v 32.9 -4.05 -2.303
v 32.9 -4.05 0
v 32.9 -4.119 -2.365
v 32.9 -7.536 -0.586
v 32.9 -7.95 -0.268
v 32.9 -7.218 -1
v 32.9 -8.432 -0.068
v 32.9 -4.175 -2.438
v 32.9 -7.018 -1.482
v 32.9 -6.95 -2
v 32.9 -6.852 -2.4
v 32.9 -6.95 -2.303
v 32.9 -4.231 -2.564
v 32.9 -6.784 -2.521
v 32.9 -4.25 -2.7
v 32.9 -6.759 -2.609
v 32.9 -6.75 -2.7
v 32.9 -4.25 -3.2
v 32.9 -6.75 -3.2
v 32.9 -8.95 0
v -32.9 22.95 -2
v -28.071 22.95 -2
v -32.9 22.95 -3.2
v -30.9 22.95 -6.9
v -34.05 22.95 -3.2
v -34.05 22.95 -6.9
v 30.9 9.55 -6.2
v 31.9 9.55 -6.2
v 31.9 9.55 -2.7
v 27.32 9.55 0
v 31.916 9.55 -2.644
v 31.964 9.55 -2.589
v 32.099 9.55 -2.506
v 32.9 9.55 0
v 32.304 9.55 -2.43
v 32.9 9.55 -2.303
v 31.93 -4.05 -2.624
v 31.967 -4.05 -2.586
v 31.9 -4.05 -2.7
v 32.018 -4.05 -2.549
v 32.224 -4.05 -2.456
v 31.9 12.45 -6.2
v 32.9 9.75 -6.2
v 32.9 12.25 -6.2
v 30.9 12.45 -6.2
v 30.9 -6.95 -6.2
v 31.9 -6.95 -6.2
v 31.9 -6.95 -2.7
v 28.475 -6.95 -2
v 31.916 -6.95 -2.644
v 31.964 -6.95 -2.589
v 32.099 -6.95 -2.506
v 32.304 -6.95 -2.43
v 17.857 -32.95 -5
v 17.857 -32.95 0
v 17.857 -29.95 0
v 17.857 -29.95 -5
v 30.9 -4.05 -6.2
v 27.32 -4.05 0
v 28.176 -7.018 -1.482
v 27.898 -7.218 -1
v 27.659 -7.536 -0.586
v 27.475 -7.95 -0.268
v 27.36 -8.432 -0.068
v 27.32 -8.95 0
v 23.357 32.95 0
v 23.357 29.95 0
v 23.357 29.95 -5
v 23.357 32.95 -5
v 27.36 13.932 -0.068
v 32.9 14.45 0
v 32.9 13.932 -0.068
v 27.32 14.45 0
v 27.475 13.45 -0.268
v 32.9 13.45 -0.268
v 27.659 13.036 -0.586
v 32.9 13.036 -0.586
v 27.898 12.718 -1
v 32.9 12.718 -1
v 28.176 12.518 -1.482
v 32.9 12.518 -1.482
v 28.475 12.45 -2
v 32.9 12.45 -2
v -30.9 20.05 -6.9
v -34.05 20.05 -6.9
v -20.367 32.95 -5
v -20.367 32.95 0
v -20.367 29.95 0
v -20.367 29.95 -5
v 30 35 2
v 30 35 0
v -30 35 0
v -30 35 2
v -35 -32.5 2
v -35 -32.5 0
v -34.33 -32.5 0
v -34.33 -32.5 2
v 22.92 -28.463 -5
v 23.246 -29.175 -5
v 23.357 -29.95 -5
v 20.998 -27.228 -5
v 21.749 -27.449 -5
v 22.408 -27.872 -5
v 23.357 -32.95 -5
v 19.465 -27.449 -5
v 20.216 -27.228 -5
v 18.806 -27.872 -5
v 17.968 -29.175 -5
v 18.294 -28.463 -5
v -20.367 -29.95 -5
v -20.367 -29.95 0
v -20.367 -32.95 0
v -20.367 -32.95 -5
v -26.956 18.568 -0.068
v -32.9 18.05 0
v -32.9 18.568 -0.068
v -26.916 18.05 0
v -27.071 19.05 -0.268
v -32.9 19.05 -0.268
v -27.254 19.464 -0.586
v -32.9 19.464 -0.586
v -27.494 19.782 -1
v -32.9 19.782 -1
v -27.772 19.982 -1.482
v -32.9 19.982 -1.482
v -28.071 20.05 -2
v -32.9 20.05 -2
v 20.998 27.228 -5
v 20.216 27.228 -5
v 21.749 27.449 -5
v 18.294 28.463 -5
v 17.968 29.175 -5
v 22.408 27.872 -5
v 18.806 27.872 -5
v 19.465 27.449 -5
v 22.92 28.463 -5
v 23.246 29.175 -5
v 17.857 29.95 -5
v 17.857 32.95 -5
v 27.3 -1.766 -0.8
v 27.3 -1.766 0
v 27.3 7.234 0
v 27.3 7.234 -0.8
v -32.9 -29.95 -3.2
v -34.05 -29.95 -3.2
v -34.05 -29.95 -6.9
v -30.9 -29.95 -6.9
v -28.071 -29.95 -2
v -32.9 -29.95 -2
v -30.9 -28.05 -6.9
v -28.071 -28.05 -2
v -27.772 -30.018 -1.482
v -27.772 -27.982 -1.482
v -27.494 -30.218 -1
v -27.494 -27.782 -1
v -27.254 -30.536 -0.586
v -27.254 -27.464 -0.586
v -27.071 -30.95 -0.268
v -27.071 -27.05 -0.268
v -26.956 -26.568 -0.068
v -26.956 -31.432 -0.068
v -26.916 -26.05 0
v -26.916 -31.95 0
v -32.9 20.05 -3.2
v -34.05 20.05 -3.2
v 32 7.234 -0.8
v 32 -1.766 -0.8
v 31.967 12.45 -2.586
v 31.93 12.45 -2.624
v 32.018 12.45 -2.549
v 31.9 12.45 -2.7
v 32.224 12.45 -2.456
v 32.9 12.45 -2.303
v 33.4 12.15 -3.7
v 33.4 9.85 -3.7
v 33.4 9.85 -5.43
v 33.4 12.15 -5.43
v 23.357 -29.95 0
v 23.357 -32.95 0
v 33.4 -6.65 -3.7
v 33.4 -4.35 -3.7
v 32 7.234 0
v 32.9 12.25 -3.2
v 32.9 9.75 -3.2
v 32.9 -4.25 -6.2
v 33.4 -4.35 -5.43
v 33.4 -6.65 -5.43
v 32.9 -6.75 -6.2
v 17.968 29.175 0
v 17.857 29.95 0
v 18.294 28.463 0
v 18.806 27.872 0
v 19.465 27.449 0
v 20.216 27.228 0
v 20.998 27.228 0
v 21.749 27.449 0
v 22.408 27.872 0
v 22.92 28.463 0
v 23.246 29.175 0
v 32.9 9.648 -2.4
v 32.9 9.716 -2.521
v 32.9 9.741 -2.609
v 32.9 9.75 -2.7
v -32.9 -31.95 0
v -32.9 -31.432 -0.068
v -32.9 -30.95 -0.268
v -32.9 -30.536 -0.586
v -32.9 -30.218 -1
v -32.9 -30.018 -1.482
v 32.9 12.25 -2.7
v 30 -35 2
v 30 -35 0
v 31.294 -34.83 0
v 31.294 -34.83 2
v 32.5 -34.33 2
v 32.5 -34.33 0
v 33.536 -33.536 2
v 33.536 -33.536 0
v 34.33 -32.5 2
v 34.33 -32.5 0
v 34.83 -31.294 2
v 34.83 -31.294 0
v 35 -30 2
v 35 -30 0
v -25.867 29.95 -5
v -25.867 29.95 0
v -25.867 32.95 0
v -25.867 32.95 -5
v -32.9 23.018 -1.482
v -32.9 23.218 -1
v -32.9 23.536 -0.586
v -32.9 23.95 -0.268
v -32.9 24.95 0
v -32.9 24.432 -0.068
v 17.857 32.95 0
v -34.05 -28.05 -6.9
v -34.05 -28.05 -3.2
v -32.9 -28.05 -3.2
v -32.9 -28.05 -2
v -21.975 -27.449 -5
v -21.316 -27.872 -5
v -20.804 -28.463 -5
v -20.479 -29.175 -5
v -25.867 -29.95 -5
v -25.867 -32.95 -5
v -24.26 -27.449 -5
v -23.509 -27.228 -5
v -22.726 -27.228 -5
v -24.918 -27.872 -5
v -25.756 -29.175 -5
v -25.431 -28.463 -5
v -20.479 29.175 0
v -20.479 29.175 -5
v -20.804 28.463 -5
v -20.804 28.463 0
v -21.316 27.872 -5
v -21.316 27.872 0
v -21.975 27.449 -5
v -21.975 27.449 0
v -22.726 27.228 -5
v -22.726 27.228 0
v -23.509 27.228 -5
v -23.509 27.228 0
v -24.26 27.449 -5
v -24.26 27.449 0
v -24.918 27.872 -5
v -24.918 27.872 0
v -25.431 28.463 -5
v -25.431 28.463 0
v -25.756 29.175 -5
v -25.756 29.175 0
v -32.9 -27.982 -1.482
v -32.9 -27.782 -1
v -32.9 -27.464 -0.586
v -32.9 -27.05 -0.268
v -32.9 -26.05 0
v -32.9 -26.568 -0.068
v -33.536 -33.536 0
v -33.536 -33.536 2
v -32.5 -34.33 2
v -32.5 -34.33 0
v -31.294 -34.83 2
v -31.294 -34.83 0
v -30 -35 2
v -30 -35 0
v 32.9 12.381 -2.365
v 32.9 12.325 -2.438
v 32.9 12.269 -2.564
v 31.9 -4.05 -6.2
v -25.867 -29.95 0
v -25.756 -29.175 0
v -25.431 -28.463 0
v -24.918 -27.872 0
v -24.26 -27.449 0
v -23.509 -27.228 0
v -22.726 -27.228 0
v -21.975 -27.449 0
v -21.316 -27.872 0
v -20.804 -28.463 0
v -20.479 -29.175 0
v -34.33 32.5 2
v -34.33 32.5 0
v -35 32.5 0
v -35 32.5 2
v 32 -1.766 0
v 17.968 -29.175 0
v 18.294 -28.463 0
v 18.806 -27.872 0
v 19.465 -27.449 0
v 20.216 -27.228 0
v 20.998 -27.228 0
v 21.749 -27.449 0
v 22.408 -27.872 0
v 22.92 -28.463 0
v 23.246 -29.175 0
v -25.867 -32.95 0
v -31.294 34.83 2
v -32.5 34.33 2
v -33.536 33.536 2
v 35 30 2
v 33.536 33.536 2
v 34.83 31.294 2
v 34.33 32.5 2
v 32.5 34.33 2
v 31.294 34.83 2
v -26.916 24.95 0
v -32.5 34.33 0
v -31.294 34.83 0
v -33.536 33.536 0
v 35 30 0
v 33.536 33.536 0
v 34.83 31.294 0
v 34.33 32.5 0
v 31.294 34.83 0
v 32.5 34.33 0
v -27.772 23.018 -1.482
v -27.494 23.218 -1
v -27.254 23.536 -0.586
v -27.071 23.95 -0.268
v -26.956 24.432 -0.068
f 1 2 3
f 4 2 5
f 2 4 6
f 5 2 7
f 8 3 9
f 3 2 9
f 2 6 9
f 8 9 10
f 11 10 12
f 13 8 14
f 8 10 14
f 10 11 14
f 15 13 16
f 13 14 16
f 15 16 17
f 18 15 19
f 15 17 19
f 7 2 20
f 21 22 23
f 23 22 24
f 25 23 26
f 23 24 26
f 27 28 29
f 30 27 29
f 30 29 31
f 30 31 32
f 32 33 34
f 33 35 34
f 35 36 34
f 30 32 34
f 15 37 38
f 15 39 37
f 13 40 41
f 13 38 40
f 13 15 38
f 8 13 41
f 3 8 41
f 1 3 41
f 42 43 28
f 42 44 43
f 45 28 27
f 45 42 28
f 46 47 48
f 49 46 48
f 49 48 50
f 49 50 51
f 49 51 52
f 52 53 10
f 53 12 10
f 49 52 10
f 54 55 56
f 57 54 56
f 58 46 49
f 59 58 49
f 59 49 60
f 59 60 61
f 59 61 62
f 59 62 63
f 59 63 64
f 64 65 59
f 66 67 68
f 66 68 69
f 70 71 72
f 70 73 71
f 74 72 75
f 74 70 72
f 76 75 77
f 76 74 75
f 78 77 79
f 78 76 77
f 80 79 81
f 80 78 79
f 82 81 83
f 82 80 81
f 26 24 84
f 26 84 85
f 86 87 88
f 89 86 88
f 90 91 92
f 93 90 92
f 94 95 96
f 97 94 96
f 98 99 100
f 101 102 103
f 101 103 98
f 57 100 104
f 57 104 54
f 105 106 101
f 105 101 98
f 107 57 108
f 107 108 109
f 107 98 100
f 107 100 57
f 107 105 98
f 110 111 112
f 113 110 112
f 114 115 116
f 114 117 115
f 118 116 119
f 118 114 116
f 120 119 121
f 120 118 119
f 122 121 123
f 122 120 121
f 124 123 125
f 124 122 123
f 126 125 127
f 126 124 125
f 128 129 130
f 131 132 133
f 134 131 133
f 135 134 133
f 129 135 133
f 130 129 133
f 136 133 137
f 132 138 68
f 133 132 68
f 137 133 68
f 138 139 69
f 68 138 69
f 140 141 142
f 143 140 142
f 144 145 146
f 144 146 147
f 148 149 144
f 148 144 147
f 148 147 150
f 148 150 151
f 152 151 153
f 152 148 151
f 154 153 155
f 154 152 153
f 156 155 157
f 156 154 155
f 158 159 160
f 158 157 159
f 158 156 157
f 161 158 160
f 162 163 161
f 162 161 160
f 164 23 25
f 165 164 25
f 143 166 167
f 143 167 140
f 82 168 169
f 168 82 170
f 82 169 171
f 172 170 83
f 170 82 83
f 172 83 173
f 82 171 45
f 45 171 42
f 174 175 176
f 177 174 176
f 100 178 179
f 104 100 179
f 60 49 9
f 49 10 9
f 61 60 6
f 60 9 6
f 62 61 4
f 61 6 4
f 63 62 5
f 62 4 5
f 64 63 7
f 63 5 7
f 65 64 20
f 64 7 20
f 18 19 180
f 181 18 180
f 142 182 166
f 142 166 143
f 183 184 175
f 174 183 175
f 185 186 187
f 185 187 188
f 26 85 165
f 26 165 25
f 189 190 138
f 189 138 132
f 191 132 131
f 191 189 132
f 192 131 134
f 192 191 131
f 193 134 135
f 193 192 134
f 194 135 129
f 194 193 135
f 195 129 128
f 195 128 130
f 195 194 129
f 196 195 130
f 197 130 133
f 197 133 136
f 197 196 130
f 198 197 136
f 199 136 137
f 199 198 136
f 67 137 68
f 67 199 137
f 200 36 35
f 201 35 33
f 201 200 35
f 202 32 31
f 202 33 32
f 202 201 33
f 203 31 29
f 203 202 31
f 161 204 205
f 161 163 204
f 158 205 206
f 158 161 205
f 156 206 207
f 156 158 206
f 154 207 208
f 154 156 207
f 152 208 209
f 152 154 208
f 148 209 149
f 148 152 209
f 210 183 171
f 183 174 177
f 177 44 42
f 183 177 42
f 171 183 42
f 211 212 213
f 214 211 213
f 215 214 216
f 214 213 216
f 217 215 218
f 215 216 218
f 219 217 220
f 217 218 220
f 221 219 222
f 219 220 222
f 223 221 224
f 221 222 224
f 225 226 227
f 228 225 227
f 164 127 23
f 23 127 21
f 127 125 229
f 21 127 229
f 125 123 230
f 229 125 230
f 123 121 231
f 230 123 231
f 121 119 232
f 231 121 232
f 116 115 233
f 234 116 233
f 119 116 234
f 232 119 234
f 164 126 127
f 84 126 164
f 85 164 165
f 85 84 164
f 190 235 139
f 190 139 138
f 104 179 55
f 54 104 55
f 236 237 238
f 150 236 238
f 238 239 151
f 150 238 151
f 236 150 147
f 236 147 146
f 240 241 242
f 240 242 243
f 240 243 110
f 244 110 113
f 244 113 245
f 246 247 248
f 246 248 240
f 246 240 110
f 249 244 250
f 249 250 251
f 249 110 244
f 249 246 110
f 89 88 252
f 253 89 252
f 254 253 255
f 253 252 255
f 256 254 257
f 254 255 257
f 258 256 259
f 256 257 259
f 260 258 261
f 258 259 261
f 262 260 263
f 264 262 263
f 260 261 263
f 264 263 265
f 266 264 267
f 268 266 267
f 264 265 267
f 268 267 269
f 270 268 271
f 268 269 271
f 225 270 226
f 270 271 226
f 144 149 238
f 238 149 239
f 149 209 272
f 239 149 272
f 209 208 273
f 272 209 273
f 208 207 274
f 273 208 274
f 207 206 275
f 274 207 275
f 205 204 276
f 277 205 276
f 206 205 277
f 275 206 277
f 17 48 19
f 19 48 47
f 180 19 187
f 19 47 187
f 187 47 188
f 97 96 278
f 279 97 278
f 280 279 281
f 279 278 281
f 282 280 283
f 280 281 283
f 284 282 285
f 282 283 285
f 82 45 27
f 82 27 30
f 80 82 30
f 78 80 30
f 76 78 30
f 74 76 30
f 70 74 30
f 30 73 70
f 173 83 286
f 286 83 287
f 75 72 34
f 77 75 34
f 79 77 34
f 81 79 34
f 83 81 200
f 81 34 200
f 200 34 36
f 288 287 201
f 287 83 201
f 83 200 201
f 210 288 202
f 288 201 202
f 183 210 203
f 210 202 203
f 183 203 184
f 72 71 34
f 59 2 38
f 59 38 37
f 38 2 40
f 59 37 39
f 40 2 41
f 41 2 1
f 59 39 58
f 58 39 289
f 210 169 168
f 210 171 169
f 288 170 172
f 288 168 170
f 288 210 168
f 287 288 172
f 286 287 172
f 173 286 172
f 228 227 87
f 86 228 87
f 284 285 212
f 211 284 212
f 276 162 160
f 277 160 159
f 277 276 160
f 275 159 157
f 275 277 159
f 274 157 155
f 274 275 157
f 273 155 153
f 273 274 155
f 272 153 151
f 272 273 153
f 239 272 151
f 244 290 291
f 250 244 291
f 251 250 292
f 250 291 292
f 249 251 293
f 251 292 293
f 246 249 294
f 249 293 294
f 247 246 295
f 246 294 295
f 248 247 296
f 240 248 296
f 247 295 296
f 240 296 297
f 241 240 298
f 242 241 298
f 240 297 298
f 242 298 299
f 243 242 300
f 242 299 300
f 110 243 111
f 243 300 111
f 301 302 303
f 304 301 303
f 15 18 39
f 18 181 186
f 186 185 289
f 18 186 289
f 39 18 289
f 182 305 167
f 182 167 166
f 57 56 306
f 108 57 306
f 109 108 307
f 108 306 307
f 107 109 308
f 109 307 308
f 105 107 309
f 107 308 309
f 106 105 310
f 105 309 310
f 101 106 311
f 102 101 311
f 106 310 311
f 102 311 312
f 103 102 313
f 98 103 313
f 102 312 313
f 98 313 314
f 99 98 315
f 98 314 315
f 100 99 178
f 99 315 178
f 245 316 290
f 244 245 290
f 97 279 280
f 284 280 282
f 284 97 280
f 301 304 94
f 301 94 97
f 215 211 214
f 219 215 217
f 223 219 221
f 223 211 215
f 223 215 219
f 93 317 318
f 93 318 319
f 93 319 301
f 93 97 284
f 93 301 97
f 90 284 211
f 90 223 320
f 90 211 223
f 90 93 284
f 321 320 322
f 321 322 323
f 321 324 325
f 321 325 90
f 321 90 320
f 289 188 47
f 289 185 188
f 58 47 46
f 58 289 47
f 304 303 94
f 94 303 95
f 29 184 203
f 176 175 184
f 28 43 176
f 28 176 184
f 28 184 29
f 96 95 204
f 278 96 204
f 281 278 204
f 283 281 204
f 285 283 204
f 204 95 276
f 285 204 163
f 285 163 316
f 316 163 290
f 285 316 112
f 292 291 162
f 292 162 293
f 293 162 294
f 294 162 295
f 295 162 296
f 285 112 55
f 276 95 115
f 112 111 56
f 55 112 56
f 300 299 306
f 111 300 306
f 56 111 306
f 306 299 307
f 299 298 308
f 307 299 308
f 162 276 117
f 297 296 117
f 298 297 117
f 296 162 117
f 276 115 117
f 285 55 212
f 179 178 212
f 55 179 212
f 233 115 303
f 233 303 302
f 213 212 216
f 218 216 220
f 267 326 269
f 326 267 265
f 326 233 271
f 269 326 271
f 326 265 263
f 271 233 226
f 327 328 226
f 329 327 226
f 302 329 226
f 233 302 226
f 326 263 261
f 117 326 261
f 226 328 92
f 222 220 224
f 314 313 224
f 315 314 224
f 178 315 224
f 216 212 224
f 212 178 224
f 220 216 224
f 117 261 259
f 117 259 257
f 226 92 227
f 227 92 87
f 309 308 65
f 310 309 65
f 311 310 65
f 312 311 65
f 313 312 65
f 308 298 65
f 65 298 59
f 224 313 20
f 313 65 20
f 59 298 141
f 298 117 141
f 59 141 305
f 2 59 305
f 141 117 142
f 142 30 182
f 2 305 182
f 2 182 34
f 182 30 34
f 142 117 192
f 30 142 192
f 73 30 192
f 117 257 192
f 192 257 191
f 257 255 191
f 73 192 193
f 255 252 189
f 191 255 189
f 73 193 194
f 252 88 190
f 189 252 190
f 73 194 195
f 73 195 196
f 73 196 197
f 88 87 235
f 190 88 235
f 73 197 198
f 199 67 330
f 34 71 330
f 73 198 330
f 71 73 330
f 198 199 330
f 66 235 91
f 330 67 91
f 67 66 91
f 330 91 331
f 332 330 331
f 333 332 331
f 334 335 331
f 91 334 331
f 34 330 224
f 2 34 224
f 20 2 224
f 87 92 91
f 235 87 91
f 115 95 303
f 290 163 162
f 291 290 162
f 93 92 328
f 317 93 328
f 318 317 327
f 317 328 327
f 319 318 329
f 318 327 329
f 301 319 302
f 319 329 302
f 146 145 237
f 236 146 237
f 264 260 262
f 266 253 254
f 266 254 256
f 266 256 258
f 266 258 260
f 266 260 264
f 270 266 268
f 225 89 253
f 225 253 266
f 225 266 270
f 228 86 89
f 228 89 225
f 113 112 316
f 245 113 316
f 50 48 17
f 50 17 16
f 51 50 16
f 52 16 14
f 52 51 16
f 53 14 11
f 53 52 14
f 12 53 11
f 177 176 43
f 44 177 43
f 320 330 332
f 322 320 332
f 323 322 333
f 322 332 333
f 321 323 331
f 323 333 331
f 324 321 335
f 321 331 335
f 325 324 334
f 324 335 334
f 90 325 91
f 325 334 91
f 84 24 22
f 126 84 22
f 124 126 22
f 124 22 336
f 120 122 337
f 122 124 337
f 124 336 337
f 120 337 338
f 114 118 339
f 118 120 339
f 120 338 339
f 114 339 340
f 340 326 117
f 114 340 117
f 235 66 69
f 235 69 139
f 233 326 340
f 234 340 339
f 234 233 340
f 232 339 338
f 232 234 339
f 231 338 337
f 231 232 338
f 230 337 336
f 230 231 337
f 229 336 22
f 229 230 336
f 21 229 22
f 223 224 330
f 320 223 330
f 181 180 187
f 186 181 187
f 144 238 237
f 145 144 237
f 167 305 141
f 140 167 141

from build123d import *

# Parameters (mm, degrees)
EXTRUDE_1_DEPTH     = 2
EXTRUDE_2_DEPTH     = 5
SKETCH_3_W          = 2
SKETCH_3_H          = 1.9
SKETCH_3_H_2        = 2.9
EXTRUDE_3_DEPTH     = 3.2
SKETCH_4_W          = 3.15
SKETCH_4_H          = 1.9
SKETCH_4_H_2        = 2.9
SKETCH_4_W_2        = 3
EXTRUDE_4_DEPTH     = 3
SKETCH_6_W          = 3.15
SKETCH_6_H          = 2.9
SKETCH_6_H_2        = 1.9
EXTRUDE_5_DEPTH     = 0.7
EXTRUDE_6_DEPTH     = 1.9
EXTRUDE_7_DEPTH     = 2.9
EXTRUDE_8_DEPTH     = 2.9
EXTRUDE_9_DEPTH     = 2.9
FILLET_1_R          = 2
CUT_EXTRUDE_1_REACH = 61.364
SKETCH_12_W         = 4.7
SKETCH_12_H         = 9
EXTRUDE_10_DEPTH    = 0.8
CHAMFER_1_SIZE      = 1
CUT_EXTRUDE_2_DEPTH = 20
CUT_EXTRUDE_3_DEPTH = 4
FILLET_2_R          = 0.5


with BuildPart() as part:
    # 草图1 → 凸台-拉伸1 (new body)
    with BuildSketch(Plane.XY):
        with BuildLine():
            Line((-30, -35), (30, -35))
            ThreePointArc((30, -35), (33.535533906, -33.535533906), (35, -30))
            Line((35, -30), (35, 30))
            ThreePointArc((35, 30), (33.535533906, 33.535533906), (30, 35))
            Line((30, 35), (-30, 35))
            ThreePointArc((-30, 35), (-32.5, 34.330127019), (-34.330127019, 32.5))
            Line((-34.330127019, 32.5), (-35, 32.5))
            Line((-35, 32.5), (-35, 30))
            Line((-35, 30), (-35, -30))
            Line((-35, -30), (-35, -32.5))
            Line((-35, -32.5), (-34.330127019, -32.5))
            ThreePointArc((-34.330127019, -32.5), (-32.5, -34.330127019), (-30, -35))
        make_face()
    extrude(amount=EXTRUDE_1_DEPTH)

    # 草图2 → 凸台-拉伸2 (add)
    with BuildSketch(Plane(origin=(0, 0, 0), x_dir=(-1, 0, 0), z_dir=(0, 0, -1))):
        with BuildLine():
            Line((25.867224141, -32.95), (25.867224141, -29.95))
            ThreePointArc((25.867224141, -29.95), (23.117224141, -27.2), (20.367224141, -29.95))
            Line((20.367224141, -29.95), (20.367224141, -32.95))
            Line((20.367224141, -32.95), (25.867224141, -32.95))
        make_face()
        with BuildLine():
            Line((20.367224141, 32.95), (20.367224141, 29.95))
            ThreePointArc((20.367224141, 29.95), (23.117224141, 27.2), (25.867224141, 29.95))
            Line((25.867224141, 29.95), (25.867224141, 32.95))
            Line((25.867224141, 32.95), (20.367224141, 32.95))
        make_face()
        with BuildLine():
            Line((-23.357009719, -29.95), (-23.357009719, -32.95))
            Line((-23.357009719, -32.95), (-17.857009719, -32.95))
            Line((-17.857009719, -32.95), (-17.857009719, -29.95))
            ThreePointArc((-17.857009719, -29.95), (-20.607009719, -27.2), (-23.357009719, -29.95))
        make_face()
        with BuildLine():
            Line((-23.357009719, 32.95), (-17.857009719, 32.95))
            Line((-17.857009719, 32.95), (-17.857009719, 29.95))
            ThreePointArc((-17.857009719, 29.95), (-20.607009719, 27.2), (-23.357009719, 29.95))
            Line((-23.357009719, 29.95), (-23.357009719, 32.95))
        make_face()
    extrude(amount=EXTRUDE_2_DEPTH)

    # 草图3 → 凸台-拉伸3 (add)
    with BuildSketch(Plane(origin=(0, 0, 0), x_dir=(-1, 0, 0), z_dir=(0, 0, -1))):
        with Locations((31.9, -29)):
            Rectangle(SKETCH_3_W, SKETCH_3_H)
        with Locations((31.9, 21.5)):
            Rectangle(SKETCH_3_W, SKETCH_3_H_2)
        with Locations((-31.9, -5.5)):
            Rectangle(SKETCH_3_W, SKETCH_3_H_2)
        with Locations((-31.9, 11)):
            Rectangle(SKETCH_3_W, SKETCH_3_H_2)
    extrude(amount=EXTRUDE_3_DEPTH)

    # 草图4 → 凸台-拉伸4 (add)
    with BuildSketch(Plane(origin=(0, 0, -3.2), x_dir=(-1, 0, 0), z_dir=(0, 0, -1))):
        with Locations((32.475, -29)):
            Rectangle(SKETCH_4_W, SKETCH_4_H)
        with Locations((32.475, 21.5)):
            Rectangle(SKETCH_4_W, SKETCH_4_H_2)
        with Locations((-32.4, -5.5)):
            Rectangle(SKETCH_4_W_2, SKETCH_4_H_2)
        with Locations((-32.4, 11)):
            Rectangle(SKETCH_4_W_2, SKETCH_4_H_2)
    extrude(amount=EXTRUDE_4_DEPTH)

    # 草图6 → 凸台-拉伸5 (add)
    with BuildSketch(Plane(origin=(0, 0, -6.2), x_dir=(-1, 0, 0), z_dir=(0, 0, -1))):
        with Locations((32.475, 21.5)):
            Rectangle(SKETCH_6_W, SKETCH_6_H)
        with Locations((32.475, -29)):
            Rectangle(SKETCH_6_W, SKETCH_6_H_2)
    extrude(amount=EXTRUDE_5_DEPTH)

    # 草图7 → 凸台-拉伸6 (add)
    with BuildSketch(Plane.XZ.offset(29.95)):
        Polygon((-30.9, -6.9), (-26.916283143, 0), (-30.9, 0), align=None)
    extrude(amount=-EXTRUDE_6_DEPTH)

    # 草图8 → 凸台-拉伸7 (add)
    with BuildSketch(Plane(origin=(0, 22.95, 0), x_dir=(1, 0, 0), z_dir=(0, 1, 0))):
        Polygon((-30.9, 6.9), (-26.916283143, 0), (-30.9, 0), align=None)
    extrude(amount=-EXTRUDE_7_DEPTH)

    # 草图9 → 凸台-拉伸8 (add)
    with BuildSketch(Plane(origin=(0, 12.45, 0), x_dir=(1, 0, 0), z_dir=(0, 1, 0))):
        Polygon((30.9, 6.2), (27.320428331, 0), (30.9, 0), align=None)
    extrude(amount=-EXTRUDE_8_DEPTH)

    # 草图10 → 凸台-拉伸9 (add)
    with BuildSketch(Plane.XZ.offset(6.95)):
        Polygon((30.9, -6.2), (27.320428331, 0), (30.9, 0), align=None)
    extrude(amount=-EXTRUDE_9_DEPTH)

    # 圆角1
    fillet_1_edges = [part.edges().sort_by_distance(p)[0] for p in [
        (-29.908141571, 22.95, 0),
        (-29.908141571, 20.05, 0),
        (30.110214166, -6.95, 0),
        (30.110214166, 12.45, 0),
        (-29.908141571, -28.05, 0),
        (-29.908141571, -29.95, 0),
    ]]
    fillet(fillet_1_edges, radius=FILLET_1_R)

    # 切除-拉伸1: up to this face of the body (flat: up to its plane)
    cut_extrude_1_end = Plane(part.part.faces().sort_by_distance((31.614518318, -6.95, -3.993006547))[0])
    # 草图11 → 切除-拉伸1 (cut, up to the picked face)
    with BuildSketch(Plane(origin=(0, 12.45, 0), x_dir=(1, 0, 0), z_dir=(0, 1, 0)), mode=Mode.PRIVATE) as cut_extrude_1_sk1:
        Polygon((33.4, 3.2), (33.9, 3.7), (33.9, 3.2), align=None)
    cut_extrude_1_tool1 = split(extrude(cut_extrude_1_sk1.sketch, amount=-CUT_EXTRUDE_1_REACH, mode=Mode.PRIVATE), bisect_by=cut_extrude_1_end, keep=Keep.BOTH, mode=Mode.PRIVATE)
    add(cut_extrude_1_tool1.solids().sort_by(Axis((33.733333, 12.45, -3.366667), (0, -1, 0)))[0], mode=Mode.SUBTRACT)

    # 草图12 → 凸台-拉伸10 (add)
    with BuildSketch(Plane(origin=(0, 0, 0), x_dir=(-1, 0, 0), z_dir=(0, 0, -1))):
        with Locations((-29.65, 2.733632703)):
            Rectangle(SKETCH_12_W, SKETCH_12_H)
    extrude(amount=EXTRUDE_10_DEPTH)

    # 倒角1
    chamfer_1_edges = [part.edges().sort_by_distance(p)[0] for p in [
        (33.9, -5.5, -6.2),
        (33.9, 11, -6.2),
    ]]
    chamfer(chamfer_1_edges, length=CHAMFER_1_SIZE)

    # 草图13 → 切除-拉伸2 (cut)
    with BuildSketch(Plane.XZ.offset(6.95)):
        Polygon((32.9, -3.2), (33.4, -3.7), (33.4, -5.430067518), (32.9, -6.2), (33.9, -5.2), (33.9, -3.7), (33.4, -3.2), align=None)
    extrude(amount=-CUT_EXTRUDE_2_DEPTH, mode=Mode.SUBTRACT)

    # 草图14 → 切除-拉伸3 (cut)
    with BuildSketch(Plane(origin=(0, 0, -6.2), x_dir=(-1, 0, 0), z_dir=(0, 0, -1))):
        Polygon((-33.4, 12.15), (-31.9, 12.45), (-33.4, 12.45), align=None)
        Polygon((-33.4, 9.55), (-33.4, 9.85), (-31.9, 9.55), align=None)
        Polygon((-33.4, -4.05), (-33.4, -4.35), (-31.9, -4.05), align=None)
        Polygon((-33.4, -6.95), (-31.9, -6.95), (-33.4, -6.65), align=None)
    extrude(amount=-CUT_EXTRUDE_3_DEPTH, mode=Mode.SUBTRACT)

    # 圆角2
    # the kernel refuses this fillet: 0.5 mm, written as the material it adds along each edge
    with BuildSketch(Plane(origin=(34.125725845, 9.995145169, -2.2), x_dir=(0, 0, -1), z_dir=(-0.9805806756909201, -0.1961161351381845, 0))) as fillet_2_piece_1_section:
        with BuildLine():
            CenterArc((FILLET_2_R, FILLET_2_R), FILLET_2_R, 180, 90)
            Line((0, FILLET_2_R), (0, 0))
            Line((0, 0), (FILLET_2_R, 0))
        make_face()
    fillet_2_piece_1 = extrude(amount=3.519803903, mode=Mode.PRIVATE)
    fillet_2_piece_1 = split(fillet_2_piece_1, bisect_by=Plane(origin=(32.9, 9.624038043, -2.351425579), z_dir=(-1, 0, 0)), keep=Keep.TOP, mode=Mode.PRIVATE)
    fillet_2_piece_1 = split(fillet_2_piece_1, bisect_by=Plane(origin=(32.529809776, 9.55, -2.351425579), z_dir=(0, 1, 0)), keep=Keep.TOP, mode=Mode.PRIVATE)
    add(fillet_2_piece_1)
    with BuildSketch(Plane(origin=(34.125725845, 12.004854831, -2.2), x_dir=(0.1961161351381845, 0.9805806756909201, 0), z_dir=(-0.9805806756909201, 0.1961161351381845, 0))) as fillet_2_piece_2_section:
        with BuildLine():
            CenterArc((FILLET_2_R, FILLET_2_R), FILLET_2_R, 180, 90)
            Line((0, FILLET_2_R), (0, 0))
            Line((0, 0), (FILLET_2_R, 0))
        make_face()
    fillet_2_piece_2 = extrude(amount=3.519803903, mode=Mode.PRIVATE)
    fillet_2_piece_2 = split(fillet_2_piece_2, bisect_by=Plane(origin=(32.9, 12.375961957, -2.351425579), z_dir=(-1, 0, 0)), keep=Keep.TOP, mode=Mode.PRIVATE)
    fillet_2_piece_2 = split(fillet_2_piece_2, bisect_by=Plane(origin=(32.529809778, 12.45, -2.351425579), z_dir=(0, -1, 0)), keep=Keep.TOP, mode=Mode.PRIVATE)
    add(fillet_2_piece_2)
    with BuildSketch(Plane(origin=(34.125725845, -4.495145169, -2.2), x_dir=(0, 0, -1), z_dir=(-0.9805806756909202, 0.1961161351381839, 0))) as fillet_2_piece_3_section:
        with BuildLine():
            CenterArc((FILLET_2_R, -FILLET_2_R), FILLET_2_R, 90, 90)
            Line((0, -FILLET_2_R), (0, 0))
            Line((0, 0), (FILLET_2_R, 0))
        make_face()
    fillet_2_piece_3 = extrude(amount=3.519803903, mode=Mode.PRIVATE)
    fillet_2_piece_3 = split(fillet_2_piece_3, bisect_by=Plane(origin=(32.529809776, -4.05, -2.351425579), z_dir=(0, -1, 0)), keep=Keep.TOP, mode=Mode.PRIVATE)
    fillet_2_piece_3 = split(fillet_2_piece_3, bisect_by=Plane(origin=(32.9, -4.124038043, -2.351425579), z_dir=(-1, 0, 0)), keep=Keep.TOP, mode=Mode.PRIVATE)
    add(fillet_2_piece_3)
    with BuildSketch(Plane(origin=(30.674274155, -7.195145169, -2.2), x_dir=(0, 0, -1), z_dir=(0.9805806756909202, 0.1961161351381839, 0))) as fillet_2_piece_4_section:
        with BuildLine():
            CenterArc((FILLET_2_R, -FILLET_2_R), FILLET_2_R, 90, 90)
            Line((0, -FILLET_2_R), (0, 0))
            Line((0, 0), (FILLET_2_R, 0))
        make_face()
    fillet_2_piece_4 = extrude(amount=3.519803903, mode=Mode.PRIVATE)
    fillet_2_piece_4 = split(fillet_2_piece_4, bisect_by=Plane(origin=(32.9, -6.875961957, -2.351425579), z_dir=(-1, 0, 0)), keep=Keep.TOP, mode=Mode.PRIVATE)
    fillet_2_piece_4 = split(fillet_2_piece_4, bisect_by=Plane(origin=(32.529809776, -6.95, -2.351425579), z_dir=(0, 1, 0)), keep=Keep.TOP, mode=Mode.PRIVATE)
    add(fillet_2_piece_4)


solid = part.part
